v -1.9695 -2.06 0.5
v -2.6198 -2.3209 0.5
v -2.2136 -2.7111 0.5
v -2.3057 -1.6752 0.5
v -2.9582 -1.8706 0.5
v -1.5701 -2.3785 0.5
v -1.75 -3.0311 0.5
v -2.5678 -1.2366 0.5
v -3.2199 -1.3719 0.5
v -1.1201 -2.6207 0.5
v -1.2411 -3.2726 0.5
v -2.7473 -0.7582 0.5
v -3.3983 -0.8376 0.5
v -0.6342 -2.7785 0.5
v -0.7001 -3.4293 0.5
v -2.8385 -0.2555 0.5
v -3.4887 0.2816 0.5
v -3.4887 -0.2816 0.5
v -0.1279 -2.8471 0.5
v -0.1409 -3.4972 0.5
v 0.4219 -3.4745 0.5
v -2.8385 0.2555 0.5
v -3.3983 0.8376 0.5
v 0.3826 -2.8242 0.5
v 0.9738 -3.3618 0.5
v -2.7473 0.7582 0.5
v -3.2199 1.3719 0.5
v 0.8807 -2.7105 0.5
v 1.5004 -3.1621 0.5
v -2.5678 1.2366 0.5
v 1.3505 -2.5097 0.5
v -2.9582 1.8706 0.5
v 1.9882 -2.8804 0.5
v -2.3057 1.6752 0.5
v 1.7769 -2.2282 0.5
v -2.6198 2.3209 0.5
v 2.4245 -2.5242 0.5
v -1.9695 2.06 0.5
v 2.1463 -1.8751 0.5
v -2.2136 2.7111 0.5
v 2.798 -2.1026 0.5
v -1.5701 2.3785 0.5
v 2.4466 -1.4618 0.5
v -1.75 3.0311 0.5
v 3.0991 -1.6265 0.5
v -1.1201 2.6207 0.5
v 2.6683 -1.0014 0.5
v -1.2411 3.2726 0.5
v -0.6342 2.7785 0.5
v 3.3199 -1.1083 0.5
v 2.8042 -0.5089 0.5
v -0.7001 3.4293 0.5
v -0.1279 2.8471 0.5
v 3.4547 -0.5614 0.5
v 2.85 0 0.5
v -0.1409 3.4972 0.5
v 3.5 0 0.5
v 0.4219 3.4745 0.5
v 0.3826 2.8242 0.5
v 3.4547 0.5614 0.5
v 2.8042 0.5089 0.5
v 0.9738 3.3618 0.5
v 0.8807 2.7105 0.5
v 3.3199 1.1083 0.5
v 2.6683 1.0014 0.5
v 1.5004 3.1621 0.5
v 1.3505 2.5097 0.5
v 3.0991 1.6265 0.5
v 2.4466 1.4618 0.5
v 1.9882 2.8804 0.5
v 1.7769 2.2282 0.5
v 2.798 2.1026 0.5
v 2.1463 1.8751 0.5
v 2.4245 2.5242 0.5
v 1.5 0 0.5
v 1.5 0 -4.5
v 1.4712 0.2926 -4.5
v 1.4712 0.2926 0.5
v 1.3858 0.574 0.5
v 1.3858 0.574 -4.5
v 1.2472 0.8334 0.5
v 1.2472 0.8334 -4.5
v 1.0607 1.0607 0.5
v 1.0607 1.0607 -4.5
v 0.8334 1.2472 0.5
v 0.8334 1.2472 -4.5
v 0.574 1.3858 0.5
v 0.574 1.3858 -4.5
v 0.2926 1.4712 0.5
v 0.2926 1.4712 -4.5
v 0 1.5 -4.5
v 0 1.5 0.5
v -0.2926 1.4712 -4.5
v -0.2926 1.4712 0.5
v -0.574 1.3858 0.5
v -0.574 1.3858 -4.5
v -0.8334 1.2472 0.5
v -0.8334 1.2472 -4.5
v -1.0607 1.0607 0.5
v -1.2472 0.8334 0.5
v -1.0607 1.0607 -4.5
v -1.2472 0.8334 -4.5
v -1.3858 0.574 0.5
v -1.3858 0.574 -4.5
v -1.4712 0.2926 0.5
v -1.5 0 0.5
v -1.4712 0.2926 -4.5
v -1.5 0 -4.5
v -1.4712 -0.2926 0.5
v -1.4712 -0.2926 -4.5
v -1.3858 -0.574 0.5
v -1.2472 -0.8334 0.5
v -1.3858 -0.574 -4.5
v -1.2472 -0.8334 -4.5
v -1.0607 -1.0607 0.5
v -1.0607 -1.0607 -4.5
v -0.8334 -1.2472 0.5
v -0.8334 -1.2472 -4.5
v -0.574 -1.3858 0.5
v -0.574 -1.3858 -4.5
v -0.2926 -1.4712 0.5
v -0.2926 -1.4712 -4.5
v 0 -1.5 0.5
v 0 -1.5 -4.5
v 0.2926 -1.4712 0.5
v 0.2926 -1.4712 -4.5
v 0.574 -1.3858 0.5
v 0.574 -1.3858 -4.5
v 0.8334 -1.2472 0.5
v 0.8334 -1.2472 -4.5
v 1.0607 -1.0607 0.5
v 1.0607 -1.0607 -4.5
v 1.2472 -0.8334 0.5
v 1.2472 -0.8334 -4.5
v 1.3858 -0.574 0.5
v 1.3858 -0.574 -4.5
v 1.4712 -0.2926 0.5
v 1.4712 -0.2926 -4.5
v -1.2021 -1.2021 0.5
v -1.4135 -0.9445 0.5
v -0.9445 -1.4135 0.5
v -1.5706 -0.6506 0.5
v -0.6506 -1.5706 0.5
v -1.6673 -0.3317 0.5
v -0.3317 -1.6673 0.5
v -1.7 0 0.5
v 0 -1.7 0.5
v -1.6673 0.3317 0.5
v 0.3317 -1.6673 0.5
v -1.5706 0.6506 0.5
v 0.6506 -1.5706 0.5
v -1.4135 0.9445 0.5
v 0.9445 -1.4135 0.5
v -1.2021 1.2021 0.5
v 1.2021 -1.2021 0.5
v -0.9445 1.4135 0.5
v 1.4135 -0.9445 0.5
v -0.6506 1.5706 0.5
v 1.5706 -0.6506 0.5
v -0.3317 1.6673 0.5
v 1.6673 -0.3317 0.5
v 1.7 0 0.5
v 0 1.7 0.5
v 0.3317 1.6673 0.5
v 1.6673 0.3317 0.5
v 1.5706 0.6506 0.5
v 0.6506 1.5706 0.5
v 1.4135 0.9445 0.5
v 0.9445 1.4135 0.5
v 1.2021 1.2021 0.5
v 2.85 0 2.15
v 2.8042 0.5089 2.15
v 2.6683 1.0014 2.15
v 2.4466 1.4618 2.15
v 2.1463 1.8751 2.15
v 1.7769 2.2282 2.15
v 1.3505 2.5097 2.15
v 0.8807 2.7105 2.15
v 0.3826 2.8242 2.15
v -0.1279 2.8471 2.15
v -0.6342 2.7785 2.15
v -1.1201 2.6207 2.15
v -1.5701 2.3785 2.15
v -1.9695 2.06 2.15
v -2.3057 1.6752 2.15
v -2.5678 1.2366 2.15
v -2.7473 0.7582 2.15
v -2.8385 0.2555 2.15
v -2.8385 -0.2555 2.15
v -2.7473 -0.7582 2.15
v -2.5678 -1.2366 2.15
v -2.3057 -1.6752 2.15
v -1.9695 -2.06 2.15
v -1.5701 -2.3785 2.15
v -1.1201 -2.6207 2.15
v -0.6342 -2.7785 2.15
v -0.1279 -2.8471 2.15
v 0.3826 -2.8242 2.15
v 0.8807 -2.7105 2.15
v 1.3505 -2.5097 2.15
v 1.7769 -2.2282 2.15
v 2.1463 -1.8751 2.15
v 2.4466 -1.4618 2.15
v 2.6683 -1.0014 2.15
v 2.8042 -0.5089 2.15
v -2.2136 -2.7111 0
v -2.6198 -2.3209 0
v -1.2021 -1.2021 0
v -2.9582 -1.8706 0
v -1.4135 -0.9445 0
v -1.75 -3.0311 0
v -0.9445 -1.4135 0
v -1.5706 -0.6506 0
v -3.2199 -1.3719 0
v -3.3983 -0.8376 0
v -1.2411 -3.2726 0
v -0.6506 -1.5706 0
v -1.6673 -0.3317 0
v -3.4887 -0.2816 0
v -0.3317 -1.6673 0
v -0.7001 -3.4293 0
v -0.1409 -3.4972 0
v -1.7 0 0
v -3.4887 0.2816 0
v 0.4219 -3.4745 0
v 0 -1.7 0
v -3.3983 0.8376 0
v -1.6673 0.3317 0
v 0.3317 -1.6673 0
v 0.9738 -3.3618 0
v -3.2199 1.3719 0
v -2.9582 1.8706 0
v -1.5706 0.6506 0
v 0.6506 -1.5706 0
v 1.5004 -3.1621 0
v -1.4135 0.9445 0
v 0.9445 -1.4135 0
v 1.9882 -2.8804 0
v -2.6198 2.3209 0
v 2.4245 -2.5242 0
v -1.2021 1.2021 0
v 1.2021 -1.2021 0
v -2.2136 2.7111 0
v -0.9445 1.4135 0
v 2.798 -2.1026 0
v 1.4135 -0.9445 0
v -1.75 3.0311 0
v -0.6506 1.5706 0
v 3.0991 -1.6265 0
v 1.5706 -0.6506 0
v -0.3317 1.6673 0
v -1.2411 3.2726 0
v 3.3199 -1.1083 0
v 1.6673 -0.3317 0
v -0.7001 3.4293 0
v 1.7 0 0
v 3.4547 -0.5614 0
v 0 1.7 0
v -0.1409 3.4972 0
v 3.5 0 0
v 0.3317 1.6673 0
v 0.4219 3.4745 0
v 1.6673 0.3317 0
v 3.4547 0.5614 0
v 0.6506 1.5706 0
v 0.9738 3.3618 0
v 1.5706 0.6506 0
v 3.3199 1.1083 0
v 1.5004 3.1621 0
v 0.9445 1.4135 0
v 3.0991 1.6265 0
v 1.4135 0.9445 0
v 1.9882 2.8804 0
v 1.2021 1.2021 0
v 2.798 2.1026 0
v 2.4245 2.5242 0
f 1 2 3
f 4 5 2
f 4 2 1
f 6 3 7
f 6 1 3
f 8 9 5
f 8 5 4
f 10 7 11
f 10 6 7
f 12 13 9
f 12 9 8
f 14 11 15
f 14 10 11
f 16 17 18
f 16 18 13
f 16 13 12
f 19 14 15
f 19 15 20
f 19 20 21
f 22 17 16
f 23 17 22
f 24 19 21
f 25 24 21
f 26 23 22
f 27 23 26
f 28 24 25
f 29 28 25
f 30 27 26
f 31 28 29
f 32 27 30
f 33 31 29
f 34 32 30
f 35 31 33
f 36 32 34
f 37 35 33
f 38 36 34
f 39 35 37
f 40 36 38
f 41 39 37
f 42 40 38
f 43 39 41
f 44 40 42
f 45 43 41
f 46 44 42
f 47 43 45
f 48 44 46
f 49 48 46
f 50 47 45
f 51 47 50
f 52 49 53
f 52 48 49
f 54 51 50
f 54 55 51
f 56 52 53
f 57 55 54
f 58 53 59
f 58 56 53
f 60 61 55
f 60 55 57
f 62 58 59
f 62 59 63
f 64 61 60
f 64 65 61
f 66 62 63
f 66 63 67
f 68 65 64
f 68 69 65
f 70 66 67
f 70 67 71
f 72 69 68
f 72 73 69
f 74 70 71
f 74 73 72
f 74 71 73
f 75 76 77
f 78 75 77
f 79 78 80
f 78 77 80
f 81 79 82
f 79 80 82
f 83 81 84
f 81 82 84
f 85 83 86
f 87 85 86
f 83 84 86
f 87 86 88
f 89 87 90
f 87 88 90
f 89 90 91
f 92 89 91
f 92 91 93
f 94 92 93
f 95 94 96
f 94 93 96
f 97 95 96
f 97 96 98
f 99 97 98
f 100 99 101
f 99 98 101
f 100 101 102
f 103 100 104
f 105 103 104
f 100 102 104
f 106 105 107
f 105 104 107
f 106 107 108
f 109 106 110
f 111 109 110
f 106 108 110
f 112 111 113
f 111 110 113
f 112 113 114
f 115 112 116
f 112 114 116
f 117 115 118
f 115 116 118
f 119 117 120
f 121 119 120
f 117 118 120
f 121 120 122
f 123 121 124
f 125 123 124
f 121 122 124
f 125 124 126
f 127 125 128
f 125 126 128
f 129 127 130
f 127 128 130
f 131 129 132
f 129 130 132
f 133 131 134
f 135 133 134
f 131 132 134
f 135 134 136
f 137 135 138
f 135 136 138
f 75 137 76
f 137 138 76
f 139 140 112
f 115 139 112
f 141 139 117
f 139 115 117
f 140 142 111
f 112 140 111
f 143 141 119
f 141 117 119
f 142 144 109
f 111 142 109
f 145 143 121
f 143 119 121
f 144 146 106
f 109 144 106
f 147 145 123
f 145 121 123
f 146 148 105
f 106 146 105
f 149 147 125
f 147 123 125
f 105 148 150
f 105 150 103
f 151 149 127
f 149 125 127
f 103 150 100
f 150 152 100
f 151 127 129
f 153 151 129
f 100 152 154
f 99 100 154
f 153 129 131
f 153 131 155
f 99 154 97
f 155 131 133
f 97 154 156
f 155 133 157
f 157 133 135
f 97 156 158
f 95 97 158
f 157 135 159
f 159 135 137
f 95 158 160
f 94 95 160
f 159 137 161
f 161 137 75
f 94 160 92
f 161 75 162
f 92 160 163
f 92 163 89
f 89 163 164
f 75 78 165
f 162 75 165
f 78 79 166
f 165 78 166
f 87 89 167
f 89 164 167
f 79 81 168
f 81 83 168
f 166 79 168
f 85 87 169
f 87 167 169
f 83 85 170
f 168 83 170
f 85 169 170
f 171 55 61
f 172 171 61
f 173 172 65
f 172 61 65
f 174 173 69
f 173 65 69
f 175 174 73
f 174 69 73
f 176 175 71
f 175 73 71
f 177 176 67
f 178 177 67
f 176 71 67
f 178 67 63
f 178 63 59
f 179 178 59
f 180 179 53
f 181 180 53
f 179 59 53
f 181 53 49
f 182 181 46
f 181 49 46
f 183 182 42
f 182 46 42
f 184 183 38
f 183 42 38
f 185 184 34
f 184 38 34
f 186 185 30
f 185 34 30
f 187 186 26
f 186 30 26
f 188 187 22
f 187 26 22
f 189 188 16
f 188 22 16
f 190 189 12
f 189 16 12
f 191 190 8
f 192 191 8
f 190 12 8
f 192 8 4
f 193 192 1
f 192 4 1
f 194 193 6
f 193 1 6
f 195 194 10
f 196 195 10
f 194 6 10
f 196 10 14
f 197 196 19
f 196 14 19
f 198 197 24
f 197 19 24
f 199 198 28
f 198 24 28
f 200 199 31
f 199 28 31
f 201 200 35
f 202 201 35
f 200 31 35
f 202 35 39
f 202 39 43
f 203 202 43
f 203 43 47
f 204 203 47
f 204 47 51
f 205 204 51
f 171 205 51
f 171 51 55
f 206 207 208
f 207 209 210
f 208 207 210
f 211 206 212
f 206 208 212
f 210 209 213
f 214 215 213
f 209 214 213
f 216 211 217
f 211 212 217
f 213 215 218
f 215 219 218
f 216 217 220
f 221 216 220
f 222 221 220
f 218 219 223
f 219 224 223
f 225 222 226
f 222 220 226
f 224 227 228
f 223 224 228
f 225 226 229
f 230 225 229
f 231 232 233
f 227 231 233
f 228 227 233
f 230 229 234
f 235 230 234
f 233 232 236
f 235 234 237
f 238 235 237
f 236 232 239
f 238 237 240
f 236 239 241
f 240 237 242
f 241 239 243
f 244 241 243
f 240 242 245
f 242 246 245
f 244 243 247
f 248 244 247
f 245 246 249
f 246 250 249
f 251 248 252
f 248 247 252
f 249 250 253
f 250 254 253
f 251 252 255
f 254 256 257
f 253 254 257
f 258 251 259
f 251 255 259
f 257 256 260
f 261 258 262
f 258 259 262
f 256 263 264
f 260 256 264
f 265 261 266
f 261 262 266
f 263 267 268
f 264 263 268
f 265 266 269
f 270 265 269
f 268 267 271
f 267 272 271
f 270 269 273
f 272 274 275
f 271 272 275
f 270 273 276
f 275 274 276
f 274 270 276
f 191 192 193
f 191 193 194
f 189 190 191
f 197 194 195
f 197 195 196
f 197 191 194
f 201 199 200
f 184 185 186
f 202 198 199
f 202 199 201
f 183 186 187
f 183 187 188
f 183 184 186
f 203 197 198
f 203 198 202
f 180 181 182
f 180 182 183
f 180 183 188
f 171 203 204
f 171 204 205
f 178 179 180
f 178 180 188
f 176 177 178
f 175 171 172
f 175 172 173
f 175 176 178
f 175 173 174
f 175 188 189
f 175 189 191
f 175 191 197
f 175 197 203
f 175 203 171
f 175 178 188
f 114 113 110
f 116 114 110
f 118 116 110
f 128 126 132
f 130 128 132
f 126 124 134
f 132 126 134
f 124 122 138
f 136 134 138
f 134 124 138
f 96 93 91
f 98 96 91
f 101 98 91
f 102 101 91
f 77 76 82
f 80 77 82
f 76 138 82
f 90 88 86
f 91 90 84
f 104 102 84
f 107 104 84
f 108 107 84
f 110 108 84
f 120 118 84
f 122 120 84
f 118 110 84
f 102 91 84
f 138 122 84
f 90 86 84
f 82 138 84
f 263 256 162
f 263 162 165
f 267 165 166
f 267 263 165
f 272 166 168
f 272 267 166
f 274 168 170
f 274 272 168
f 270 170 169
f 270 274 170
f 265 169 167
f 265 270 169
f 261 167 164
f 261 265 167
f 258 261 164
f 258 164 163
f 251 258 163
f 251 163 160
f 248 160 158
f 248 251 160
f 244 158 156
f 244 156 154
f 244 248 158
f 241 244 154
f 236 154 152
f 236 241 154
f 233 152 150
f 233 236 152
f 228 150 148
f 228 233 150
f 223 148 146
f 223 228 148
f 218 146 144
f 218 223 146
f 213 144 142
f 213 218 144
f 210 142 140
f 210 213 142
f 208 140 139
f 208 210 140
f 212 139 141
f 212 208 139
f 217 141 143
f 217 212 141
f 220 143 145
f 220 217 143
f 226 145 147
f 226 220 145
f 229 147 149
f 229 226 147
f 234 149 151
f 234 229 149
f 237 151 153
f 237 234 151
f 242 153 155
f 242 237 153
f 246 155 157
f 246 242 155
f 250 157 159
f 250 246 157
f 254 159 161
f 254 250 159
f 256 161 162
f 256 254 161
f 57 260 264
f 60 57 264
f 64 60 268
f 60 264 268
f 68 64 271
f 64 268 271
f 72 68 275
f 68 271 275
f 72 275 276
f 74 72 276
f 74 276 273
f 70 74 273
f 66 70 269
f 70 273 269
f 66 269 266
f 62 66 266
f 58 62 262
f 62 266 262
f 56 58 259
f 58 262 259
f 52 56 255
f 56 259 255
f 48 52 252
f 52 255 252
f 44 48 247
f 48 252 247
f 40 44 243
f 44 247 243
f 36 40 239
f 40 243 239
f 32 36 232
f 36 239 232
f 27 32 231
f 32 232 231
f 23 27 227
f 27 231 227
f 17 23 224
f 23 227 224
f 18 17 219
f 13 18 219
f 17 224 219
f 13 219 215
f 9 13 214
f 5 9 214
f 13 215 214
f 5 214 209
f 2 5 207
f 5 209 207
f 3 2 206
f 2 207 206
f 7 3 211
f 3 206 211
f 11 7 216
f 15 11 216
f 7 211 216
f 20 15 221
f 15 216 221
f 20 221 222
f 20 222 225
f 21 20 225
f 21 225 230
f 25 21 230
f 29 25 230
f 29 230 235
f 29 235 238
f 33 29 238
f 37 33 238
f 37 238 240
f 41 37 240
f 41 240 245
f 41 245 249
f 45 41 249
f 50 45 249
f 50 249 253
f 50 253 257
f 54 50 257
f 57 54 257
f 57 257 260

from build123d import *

# Parameters (mm, degrees)
LOW_START                          = 0.5
LOW_SCREW_HEAD_PROFILE_R           = 2.85
LOW_SCREW_HEAD_DEPTH               = 1.65
M3_START                           = -4.5
M3_SHANK_THREADS_OMITTED_PROFILE_R = 1.5
M3_SHANK_THREADS_OMITTED_DEPTH     = 5
M3_WASHER_ENVELOPE_PROFILE_R       = 3.5
M3_WASHER_ENVELOPE_PROFILE_R_2     = 1.7
M3_WASHER_ENVELOPE_DEPTH           = 0.5


with BuildPart() as part:
    # Low screw head profile → Low screw head (new body)
    with BuildSketch(Plane.XY.offset(LOW_START)):
        Circle(LOW_SCREW_HEAD_PROFILE_R)
    extrude(amount=LOW_SCREW_HEAD_DEPTH)

    # M3 shank, threads omitted profile → M3 shank, threads omitted (add)
    with BuildSketch(Plane.XY.offset(M3_START)):
        Circle(M3_SHANK_THREADS_OMITTED_PROFILE_R)
    extrude(amount=M3_SHANK_THREADS_OMITTED_DEPTH)

    # M3 washer envelope profile → M3 washer envelope (add)
    with BuildSketch(Plane.XY):
        Circle(M3_WASHER_ENVELOPE_PROFILE_R)
        Circle(M3_WASHER_ENVELOPE_PROFILE_R_2, mode=Mode.SUBTRACT)
    extrude(amount=M3_WASHER_ENVELOPE_DEPTH)


solid = part.part
